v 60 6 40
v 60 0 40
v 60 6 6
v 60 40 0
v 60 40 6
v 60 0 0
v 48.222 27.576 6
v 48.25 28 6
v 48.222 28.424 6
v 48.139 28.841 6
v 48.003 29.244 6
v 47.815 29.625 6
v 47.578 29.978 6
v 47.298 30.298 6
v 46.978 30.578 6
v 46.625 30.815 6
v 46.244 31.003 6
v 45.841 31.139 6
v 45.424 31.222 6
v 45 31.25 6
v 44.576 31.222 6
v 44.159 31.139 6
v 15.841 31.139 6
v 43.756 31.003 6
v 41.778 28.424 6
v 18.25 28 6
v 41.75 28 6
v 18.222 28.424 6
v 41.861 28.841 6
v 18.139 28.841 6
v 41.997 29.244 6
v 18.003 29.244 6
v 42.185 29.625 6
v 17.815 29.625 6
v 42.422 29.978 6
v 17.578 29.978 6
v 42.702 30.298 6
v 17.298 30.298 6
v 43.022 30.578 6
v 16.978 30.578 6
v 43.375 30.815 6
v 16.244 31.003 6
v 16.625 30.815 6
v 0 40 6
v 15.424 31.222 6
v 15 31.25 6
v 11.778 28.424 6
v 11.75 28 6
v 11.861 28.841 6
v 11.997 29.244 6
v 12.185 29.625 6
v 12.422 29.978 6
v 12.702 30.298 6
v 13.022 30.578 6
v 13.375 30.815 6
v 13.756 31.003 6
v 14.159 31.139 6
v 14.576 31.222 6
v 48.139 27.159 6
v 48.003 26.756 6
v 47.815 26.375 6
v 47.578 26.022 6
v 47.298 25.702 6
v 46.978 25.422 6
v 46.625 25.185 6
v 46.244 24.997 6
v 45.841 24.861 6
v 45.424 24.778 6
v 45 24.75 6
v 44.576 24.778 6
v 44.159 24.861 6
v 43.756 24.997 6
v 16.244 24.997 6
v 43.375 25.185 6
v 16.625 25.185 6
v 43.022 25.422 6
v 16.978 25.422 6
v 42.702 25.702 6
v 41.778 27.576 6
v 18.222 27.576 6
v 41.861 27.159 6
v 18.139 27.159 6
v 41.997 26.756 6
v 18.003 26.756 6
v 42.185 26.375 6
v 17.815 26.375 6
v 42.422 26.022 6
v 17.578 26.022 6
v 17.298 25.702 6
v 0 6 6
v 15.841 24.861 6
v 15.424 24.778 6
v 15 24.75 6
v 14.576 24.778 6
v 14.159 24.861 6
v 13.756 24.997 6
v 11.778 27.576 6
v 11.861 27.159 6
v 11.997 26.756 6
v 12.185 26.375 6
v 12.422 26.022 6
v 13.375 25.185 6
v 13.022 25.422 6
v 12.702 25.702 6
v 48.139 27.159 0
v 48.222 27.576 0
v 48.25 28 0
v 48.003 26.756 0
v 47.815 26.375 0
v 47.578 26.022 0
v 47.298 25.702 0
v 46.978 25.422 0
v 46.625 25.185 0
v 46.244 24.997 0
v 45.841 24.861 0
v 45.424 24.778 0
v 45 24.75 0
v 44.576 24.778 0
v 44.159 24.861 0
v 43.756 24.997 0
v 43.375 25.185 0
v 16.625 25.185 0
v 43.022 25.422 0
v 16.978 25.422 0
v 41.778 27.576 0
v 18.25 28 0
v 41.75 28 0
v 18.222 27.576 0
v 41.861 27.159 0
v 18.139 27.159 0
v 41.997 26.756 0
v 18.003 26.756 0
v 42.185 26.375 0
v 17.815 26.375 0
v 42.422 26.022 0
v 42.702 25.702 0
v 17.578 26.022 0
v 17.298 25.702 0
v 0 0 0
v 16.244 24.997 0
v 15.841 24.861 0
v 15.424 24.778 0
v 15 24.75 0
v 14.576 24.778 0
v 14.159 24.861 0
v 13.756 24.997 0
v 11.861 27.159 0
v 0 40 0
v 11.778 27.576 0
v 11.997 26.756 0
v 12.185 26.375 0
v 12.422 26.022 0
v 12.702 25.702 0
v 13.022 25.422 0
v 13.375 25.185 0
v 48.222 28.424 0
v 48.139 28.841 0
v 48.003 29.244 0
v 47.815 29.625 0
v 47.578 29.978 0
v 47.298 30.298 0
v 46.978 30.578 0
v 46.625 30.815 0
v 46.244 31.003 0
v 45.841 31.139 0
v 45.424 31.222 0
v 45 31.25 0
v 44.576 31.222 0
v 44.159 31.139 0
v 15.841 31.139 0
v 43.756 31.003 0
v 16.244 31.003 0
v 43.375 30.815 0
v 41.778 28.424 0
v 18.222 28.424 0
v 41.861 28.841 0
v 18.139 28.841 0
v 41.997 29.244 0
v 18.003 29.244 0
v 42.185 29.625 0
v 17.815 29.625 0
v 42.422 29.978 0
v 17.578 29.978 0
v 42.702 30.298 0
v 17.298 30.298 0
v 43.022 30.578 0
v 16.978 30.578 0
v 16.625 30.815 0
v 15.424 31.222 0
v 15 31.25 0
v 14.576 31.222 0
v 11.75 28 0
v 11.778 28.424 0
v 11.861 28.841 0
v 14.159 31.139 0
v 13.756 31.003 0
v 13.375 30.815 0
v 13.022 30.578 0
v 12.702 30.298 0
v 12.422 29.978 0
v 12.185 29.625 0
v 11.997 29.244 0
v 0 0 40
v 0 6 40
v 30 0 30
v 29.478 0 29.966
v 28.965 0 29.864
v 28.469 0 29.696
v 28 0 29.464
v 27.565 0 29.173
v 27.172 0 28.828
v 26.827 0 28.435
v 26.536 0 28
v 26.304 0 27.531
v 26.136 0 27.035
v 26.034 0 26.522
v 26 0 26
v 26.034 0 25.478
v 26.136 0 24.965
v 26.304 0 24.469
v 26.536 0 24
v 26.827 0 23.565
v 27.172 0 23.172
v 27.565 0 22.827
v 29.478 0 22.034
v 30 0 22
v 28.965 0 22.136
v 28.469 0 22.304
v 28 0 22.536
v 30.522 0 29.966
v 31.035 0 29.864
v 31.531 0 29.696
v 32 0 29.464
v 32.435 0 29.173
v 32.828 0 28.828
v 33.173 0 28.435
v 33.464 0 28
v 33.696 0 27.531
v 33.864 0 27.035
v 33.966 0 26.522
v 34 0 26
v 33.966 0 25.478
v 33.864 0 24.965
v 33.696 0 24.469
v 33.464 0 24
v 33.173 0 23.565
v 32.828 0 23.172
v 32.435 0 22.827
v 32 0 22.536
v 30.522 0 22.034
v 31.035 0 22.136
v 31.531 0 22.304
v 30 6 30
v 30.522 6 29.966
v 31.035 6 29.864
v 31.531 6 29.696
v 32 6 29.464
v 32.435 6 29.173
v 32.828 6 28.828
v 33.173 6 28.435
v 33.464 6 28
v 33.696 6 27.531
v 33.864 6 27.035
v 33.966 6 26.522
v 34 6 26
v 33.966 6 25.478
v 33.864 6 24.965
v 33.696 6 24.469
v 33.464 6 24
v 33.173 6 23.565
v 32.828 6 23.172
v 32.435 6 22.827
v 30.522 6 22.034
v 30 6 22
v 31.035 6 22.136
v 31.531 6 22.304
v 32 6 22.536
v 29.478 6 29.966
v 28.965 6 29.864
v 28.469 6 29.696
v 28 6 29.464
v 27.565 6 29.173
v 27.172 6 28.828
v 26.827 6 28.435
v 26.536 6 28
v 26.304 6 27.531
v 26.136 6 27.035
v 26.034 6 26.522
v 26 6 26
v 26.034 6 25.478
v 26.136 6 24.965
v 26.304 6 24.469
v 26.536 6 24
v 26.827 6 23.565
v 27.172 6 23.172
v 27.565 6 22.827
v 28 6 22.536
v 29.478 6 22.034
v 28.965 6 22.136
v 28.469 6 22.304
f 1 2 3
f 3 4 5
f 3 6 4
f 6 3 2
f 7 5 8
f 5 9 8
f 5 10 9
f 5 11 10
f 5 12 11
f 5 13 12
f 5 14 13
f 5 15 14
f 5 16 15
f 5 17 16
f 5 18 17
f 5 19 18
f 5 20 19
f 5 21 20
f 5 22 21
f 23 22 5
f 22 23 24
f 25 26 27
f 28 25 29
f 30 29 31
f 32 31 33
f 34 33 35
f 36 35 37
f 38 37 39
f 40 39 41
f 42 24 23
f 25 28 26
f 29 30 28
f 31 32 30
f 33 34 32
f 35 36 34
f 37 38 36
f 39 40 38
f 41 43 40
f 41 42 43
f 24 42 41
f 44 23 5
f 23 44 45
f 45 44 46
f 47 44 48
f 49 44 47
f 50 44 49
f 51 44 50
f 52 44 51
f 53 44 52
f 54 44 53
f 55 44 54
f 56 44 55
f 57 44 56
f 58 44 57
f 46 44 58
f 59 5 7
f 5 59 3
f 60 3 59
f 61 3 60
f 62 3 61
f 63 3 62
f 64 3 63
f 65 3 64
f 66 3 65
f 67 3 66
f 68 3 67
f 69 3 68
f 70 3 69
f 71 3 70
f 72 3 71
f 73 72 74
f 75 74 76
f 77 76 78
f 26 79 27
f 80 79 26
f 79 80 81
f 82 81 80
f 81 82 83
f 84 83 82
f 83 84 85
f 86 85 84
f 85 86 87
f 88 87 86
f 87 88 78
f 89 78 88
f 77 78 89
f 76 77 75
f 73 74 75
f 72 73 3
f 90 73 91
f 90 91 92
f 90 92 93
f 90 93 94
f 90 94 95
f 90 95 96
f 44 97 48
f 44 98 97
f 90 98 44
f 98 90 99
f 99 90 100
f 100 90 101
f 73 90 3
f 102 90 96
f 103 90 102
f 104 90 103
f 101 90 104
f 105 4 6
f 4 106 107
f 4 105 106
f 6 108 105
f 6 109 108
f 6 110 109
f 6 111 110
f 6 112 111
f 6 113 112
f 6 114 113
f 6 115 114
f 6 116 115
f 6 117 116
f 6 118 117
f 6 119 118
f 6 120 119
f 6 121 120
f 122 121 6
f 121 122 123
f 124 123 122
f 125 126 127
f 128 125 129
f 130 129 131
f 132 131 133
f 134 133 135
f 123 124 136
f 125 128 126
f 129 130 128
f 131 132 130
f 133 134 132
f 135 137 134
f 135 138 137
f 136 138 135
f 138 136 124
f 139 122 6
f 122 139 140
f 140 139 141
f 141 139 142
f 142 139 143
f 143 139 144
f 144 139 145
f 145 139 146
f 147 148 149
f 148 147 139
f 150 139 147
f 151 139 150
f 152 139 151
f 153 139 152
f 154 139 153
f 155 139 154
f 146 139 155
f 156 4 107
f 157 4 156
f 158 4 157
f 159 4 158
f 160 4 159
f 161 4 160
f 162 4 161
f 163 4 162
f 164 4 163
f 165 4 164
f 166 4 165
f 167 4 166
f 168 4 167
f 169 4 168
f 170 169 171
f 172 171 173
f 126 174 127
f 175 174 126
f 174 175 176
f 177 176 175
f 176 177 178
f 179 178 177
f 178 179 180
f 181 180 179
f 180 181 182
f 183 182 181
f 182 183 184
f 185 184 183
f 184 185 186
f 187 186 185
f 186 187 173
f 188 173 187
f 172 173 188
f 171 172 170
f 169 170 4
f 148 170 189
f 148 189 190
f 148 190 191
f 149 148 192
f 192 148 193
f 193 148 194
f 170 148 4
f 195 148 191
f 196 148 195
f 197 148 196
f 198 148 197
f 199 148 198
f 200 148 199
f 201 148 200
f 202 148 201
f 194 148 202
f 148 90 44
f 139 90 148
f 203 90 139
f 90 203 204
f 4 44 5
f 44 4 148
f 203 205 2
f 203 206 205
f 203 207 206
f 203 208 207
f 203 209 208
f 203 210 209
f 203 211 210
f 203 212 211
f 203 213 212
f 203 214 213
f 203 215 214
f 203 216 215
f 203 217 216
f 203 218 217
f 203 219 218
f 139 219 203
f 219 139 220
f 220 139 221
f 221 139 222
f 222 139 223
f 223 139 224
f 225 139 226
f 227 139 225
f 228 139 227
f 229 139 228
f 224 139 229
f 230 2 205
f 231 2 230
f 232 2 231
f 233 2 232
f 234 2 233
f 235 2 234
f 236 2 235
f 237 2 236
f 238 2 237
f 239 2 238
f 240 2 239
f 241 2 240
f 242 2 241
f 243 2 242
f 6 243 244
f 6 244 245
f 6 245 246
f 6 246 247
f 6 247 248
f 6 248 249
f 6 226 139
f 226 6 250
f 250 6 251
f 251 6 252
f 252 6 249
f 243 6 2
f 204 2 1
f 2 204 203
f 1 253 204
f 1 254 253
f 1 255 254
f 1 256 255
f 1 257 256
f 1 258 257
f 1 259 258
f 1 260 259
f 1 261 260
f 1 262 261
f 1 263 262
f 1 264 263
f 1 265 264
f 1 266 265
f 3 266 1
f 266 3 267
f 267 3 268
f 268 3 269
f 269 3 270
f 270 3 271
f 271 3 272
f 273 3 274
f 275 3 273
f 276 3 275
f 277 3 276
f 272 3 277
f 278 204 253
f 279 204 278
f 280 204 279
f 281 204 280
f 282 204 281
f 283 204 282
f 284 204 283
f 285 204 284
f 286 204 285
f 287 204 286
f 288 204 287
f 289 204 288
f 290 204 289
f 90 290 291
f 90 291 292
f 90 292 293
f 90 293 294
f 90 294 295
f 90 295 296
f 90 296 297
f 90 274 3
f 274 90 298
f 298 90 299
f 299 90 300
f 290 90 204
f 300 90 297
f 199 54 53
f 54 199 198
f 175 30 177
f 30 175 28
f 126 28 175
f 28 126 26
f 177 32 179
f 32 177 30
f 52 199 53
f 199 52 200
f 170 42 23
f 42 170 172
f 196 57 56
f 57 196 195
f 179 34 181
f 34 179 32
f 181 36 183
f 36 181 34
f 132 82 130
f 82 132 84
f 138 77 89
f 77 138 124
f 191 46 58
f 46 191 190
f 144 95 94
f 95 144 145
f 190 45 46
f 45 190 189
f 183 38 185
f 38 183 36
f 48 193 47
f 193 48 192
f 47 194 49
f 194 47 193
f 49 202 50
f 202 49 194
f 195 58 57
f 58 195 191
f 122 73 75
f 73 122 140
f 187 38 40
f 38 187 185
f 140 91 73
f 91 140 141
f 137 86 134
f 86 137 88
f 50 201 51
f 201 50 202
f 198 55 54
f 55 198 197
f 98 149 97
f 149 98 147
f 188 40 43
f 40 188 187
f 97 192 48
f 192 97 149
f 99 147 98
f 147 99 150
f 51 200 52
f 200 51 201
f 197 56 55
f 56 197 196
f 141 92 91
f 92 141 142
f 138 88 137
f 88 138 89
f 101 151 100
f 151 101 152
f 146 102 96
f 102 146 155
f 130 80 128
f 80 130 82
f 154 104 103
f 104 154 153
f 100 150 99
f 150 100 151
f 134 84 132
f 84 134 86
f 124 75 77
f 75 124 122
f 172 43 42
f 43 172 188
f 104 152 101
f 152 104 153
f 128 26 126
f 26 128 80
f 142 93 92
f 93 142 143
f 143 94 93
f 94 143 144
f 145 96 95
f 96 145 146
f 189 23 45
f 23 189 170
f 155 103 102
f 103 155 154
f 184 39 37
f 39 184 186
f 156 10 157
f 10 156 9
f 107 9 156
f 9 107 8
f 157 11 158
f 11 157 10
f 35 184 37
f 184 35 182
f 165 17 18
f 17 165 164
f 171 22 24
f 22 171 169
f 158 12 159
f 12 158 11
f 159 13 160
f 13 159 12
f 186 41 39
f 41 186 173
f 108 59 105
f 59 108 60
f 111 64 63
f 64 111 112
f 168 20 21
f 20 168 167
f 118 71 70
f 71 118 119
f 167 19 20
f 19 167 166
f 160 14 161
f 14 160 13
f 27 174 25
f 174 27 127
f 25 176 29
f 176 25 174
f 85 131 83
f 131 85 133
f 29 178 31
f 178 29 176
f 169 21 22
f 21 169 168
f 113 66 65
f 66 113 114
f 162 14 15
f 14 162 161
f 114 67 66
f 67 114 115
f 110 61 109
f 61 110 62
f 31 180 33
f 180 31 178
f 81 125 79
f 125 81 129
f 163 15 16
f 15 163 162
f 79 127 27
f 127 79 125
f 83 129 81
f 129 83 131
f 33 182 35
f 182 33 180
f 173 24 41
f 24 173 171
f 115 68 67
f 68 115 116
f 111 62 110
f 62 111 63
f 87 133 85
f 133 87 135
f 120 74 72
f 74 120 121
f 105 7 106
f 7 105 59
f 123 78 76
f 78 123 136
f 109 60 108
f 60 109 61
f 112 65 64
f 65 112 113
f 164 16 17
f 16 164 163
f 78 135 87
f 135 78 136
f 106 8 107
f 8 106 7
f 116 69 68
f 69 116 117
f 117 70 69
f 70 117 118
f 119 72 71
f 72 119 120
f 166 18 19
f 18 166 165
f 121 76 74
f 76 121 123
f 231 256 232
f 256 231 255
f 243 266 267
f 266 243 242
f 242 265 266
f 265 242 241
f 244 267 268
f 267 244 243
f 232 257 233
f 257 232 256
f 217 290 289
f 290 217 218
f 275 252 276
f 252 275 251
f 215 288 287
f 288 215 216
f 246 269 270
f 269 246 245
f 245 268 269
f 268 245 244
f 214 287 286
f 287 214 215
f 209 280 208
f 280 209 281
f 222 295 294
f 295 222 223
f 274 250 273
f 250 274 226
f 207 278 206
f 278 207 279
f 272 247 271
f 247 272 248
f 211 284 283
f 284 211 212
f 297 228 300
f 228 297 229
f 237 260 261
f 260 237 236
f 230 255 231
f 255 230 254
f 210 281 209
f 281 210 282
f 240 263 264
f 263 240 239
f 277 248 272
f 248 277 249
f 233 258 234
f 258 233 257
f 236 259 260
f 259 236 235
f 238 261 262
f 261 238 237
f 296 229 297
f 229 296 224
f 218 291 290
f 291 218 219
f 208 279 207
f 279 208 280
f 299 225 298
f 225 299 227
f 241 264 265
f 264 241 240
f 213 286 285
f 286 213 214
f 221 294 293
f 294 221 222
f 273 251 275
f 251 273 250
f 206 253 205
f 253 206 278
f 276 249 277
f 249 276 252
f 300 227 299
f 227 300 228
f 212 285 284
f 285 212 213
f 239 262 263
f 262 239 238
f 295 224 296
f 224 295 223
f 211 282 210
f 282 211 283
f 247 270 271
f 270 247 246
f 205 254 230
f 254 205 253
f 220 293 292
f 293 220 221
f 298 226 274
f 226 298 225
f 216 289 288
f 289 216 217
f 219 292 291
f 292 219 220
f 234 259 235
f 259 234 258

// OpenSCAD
// L-bracket, 60 x 40 x 40 mm, 6 mm plate: the site's test part as an OpenSCAD script.
// Units are millimeters. Example for the engineering map, CC0.
plate = 6;      // plate thickness
w = 60;         // width (x)
d = 40;         // depth of the base (y)
h = 40;         // height of the upright (z)

difference() {
    union() {
        cube([w, d, plate]);              // base plate
        cube([w, plate, h]);              // upright plate
    }
    // two 6.5 mm holes through the base
    for (x = [15, 45])
        translate([x, d - 12, -1]) cylinder(d = 6.5, h = plate + 2, $fn = 48);
    // one 8 mm hole through the upright
    translate([w / 2, -1, h - 14]) rotate([-90, 0, 0]) cylinder(d = 8, h = plate + 2, $fn = 48);
}
